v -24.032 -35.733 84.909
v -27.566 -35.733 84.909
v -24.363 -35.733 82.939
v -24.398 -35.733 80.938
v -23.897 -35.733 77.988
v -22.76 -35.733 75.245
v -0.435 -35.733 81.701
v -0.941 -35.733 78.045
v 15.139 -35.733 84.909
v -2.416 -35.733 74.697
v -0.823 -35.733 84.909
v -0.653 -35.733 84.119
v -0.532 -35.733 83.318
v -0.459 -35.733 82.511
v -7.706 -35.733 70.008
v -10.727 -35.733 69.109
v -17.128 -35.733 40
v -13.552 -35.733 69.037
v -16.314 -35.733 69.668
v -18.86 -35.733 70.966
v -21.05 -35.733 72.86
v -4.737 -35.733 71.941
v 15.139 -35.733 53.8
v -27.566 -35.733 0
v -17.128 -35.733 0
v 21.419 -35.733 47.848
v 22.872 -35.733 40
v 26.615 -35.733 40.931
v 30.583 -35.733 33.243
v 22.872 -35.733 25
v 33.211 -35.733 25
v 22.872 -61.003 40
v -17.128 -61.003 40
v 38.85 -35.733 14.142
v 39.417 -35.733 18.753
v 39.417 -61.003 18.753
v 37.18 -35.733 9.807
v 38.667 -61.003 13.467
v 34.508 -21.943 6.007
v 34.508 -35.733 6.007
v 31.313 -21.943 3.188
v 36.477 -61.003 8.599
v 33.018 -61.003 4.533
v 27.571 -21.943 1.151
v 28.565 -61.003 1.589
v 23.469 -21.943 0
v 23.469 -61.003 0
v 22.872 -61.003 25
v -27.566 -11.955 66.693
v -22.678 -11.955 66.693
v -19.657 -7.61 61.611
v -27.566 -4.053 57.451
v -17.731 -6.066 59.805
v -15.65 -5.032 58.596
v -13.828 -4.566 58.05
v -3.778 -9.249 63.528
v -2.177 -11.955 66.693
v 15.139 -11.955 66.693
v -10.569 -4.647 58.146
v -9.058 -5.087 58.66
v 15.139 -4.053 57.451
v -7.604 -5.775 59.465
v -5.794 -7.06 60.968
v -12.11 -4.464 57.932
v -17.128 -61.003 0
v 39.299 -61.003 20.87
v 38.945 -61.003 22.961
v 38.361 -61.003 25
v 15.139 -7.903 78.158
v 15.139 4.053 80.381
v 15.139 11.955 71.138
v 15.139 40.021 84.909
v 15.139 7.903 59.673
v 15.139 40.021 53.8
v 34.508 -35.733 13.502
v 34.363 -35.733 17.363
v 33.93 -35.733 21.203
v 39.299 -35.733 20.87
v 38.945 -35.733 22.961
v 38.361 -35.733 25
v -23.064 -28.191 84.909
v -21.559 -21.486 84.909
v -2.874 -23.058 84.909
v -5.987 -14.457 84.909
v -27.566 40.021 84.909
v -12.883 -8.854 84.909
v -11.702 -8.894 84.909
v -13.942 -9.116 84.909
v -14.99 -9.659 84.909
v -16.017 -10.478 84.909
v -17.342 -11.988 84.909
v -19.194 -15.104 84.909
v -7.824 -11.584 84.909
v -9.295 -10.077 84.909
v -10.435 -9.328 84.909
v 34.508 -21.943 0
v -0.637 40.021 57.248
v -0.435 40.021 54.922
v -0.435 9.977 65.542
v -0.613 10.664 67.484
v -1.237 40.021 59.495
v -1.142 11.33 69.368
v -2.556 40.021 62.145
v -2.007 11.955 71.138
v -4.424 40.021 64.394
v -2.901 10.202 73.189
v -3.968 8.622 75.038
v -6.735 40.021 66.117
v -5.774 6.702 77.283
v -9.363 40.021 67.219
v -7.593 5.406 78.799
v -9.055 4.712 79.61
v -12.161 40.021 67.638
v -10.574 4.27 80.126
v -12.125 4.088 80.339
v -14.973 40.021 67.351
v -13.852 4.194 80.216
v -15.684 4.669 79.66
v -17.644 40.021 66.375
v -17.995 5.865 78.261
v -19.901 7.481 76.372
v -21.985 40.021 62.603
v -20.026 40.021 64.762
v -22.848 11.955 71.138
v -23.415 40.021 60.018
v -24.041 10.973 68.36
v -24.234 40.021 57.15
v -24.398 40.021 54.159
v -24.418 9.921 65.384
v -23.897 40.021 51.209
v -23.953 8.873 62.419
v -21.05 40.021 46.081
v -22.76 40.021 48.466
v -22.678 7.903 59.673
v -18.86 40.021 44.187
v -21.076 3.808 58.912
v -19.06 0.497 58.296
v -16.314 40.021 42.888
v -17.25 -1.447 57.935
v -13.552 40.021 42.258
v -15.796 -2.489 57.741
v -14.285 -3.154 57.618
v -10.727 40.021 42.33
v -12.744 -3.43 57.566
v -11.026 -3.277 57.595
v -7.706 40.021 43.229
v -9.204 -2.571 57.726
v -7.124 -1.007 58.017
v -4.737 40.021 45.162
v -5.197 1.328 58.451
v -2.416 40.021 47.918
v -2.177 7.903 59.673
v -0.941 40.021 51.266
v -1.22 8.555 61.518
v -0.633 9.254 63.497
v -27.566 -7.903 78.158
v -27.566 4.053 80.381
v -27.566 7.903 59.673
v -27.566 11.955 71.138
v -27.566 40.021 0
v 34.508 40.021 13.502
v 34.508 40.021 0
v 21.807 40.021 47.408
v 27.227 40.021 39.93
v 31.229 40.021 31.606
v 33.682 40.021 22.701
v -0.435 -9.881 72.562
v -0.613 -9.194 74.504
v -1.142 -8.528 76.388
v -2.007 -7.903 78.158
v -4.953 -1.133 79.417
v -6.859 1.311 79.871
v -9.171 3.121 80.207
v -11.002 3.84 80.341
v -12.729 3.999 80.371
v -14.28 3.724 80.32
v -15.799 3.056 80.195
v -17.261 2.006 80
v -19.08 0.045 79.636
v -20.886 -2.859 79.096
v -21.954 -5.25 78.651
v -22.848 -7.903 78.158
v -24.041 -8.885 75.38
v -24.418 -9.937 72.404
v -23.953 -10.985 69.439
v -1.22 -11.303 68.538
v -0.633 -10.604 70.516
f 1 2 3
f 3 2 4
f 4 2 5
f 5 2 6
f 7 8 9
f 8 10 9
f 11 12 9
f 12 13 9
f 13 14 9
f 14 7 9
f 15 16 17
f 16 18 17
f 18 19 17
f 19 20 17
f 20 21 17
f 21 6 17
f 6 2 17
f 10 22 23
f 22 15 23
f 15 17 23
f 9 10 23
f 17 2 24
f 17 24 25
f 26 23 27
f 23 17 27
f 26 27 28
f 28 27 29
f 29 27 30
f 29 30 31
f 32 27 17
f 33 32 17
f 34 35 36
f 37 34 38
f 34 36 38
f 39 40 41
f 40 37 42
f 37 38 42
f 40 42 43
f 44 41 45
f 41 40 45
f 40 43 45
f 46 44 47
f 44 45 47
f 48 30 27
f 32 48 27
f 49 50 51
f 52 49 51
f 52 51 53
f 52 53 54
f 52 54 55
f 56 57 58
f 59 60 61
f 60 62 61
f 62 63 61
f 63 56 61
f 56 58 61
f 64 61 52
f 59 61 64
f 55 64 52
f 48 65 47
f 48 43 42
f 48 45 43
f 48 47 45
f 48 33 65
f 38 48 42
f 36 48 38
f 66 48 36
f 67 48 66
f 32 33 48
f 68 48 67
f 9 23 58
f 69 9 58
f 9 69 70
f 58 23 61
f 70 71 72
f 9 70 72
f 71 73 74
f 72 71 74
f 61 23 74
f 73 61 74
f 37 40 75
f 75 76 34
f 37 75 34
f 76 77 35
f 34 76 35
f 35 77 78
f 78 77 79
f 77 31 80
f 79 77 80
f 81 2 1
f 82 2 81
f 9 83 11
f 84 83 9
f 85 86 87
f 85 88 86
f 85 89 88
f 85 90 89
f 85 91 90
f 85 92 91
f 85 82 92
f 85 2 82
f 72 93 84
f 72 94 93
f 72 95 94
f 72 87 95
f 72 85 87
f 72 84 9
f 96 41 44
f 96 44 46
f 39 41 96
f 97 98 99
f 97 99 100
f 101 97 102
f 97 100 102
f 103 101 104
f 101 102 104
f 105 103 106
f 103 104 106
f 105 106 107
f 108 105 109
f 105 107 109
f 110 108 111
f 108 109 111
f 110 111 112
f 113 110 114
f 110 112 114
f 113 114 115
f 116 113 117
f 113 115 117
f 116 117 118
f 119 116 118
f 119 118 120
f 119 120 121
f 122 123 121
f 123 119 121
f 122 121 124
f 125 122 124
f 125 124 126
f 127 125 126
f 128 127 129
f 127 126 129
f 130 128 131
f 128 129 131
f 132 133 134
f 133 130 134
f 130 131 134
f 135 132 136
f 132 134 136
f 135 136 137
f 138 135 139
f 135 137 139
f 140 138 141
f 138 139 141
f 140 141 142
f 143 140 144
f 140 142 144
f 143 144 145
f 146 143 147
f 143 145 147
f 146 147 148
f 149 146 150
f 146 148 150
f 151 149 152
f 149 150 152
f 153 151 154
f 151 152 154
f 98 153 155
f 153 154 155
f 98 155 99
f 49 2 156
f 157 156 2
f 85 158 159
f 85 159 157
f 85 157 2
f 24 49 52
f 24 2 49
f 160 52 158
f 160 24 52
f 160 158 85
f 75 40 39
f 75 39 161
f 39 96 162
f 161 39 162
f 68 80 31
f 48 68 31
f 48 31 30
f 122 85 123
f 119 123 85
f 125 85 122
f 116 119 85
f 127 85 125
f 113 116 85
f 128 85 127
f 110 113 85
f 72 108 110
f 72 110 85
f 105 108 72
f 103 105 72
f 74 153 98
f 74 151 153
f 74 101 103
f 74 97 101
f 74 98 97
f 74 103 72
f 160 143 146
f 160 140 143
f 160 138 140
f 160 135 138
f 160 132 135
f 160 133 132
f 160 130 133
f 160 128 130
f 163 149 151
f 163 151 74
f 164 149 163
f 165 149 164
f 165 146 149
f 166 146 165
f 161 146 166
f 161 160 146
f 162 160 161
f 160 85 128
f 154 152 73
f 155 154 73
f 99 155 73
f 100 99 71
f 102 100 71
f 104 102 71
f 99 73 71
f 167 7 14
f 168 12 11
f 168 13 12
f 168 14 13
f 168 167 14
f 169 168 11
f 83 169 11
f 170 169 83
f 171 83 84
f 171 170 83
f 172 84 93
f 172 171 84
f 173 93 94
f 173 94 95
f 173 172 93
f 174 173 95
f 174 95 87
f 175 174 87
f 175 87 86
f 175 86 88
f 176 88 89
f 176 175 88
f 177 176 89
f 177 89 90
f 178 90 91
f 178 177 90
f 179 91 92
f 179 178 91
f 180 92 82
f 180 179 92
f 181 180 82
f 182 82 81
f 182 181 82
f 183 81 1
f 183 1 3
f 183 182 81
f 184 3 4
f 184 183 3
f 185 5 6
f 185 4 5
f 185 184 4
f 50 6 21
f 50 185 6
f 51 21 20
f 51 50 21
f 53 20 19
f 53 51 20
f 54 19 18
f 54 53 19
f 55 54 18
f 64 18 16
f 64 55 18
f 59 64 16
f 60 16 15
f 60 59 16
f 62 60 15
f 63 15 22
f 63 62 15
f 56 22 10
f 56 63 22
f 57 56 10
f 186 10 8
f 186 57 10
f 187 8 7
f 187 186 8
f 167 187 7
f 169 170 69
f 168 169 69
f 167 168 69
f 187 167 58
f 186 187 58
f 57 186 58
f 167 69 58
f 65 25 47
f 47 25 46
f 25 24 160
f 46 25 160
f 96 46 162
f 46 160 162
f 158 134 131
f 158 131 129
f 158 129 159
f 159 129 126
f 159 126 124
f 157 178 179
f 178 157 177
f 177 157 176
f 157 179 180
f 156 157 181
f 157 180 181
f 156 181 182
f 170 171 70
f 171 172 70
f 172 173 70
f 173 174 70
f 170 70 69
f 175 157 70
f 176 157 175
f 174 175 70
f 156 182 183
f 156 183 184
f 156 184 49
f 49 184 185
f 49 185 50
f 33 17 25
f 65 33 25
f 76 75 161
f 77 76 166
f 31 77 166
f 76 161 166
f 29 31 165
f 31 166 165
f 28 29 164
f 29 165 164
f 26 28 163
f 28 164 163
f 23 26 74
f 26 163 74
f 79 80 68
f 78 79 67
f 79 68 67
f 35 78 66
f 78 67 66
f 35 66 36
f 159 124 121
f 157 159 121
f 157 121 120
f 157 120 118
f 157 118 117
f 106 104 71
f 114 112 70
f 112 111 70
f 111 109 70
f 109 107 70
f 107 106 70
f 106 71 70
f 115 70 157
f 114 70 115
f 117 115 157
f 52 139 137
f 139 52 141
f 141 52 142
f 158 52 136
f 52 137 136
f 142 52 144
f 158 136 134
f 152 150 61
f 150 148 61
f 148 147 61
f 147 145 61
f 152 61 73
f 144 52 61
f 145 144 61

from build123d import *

# Parameters (mm, degrees)
F0_W          = 62.0737820864
F0_H          = 75.7545232773
F1_DEPTH      = 53.8003519177
F2_W          = 42.7050869912
F2_H          = 75.7545232773
F3_DEPTH      = 31.1090257019
F5_DEPTH      = 50.4763200879
F6_R          = 11.9924338382
F7_DEPTH      = 57.1455173194
F7_DEPTH_BACK = 70.5328881741
F8_W          = 23.3642431419
F8_H          = 25
F9_DEPTH      = 25.2702012658
F11_DEPTH     = 39.0601754189
F12_T1_DEPTH  = 176.500859237


# Not quite as in the source:
# - a fillet or chamfer that OpenCascade refuses, or shapes differently, is made with other operations: its cross-section is extruded or revolved along the edge and cut away or added


with BuildPart() as f1:
    # F0 (on Top) → F1 (new body)
    with BuildSketch(Plane.XY):
        with Locations((3.4712180495, 2.1439939737)):
            Rectangle(F0_W, F0_H)
    extrude(amount=F1_DEPTH)

    # F2 (on face) → F3 (join)
    with BuildSketch(Plane.XY.offset(53.8003519177)):
        with Locations((-6.2131294981, 2.1439939737)):
            Rectangle(F2_W, F2_H)
    extrude(amount=F3_DEPTH)

    # F4 (on face) → F5 (cut)
    with BuildSketch(Plane.YZ.offset(15.1394139975)):
        Polygon((7.902597892, 59.6732337929), (11.9554921985, 71.1383074522), (4.0528943065, 80.3807537101), (-7.902597892, 78.1581263088), (-11.9554921985, 66.6930526495), (-4.0528943065, 57.4506063916), align=None)
    extrude(amount=-F5_DEPTH, mode=Mode.SUBTRACT)

    # F6 (on face) → F7 (cut, two sides)
    with BuildSketch(Plane(origin=(0, -11.726481381, 4.1453017256), x_dir=(1, 0, 0), z_dir=(0, -0.9428250988, 0.3332879132))) as f7_sk:
        with Locations((-12.427136302, 65.1199892163)):
            Circle(F6_R)
    extrude(amount=-F7_DEPTH, mode=Mode.SUBTRACT)
    extrude(f7_sk.sketch, amount=F7_DEPTH_BACK, mode=Mode.SUBTRACT)

    # F8 (on face) → F9 (join)
    with BuildSketch(Plane.XZ.offset(35.7332676649)):
        with Locations((46.1902306637, 12.5)):
            Rectangle(F8_W, F8_H)
        Polygon((-17.1276477654, 40), (-17.1276477654, 0), (34.5081090927, 0), (34.5081090927, 25), (22.8723522346, 25), (22.8723522346, 40), align=None)
    extrude(amount=F9_DEPTH)

    # F10 (on face) → F11 (cut)
    with BuildSketch(Plane.XZ.offset(61.0034689307)):
        with BuildLine():
            ThreePointArc((38.360852409, 25), (39.1514020631, 21.9206371156), (39.417401399, 18.7525637448))
            ThreePointArc((39.417401399, 18.7525637448), (34.8909952827, 6.443784061), (23.4685587384, 0))
            Line((23.4685587384, 0), (57.8723522346, 0))
            Line((57.8723522346, 0), (57.8723522346, 25))
            Line((57.8723522346, 25), (38.360852409, 25))
        make_face()
    extrude(amount=-F11_DEPTH, mode=Mode.SUBTRACT)

    # F12: fillet of radius 51.606941339 on 1 edges, made by hand

    # F12_s2 → F12_t1 (cut)
    with BuildSketch(Plane.XZ.offset(-140.7675915721)):
        with BuildLine():
            ThreePointArc((34.5081090927, 13.5018175338), (29.4145726879, 35.8575674831), (15.1394139975, 53.8003519177))
            Line((15.1394139975, 53.8003519177), (34.5081090927, 53.8003519177))
            Line((34.5081090927, 53.8003519177), (34.5081090927, 13.5018175338))
        make_face()
    extrude(amount=F12_T1_DEPTH, mode=Mode.SUBTRACT)


solid = f1.part
